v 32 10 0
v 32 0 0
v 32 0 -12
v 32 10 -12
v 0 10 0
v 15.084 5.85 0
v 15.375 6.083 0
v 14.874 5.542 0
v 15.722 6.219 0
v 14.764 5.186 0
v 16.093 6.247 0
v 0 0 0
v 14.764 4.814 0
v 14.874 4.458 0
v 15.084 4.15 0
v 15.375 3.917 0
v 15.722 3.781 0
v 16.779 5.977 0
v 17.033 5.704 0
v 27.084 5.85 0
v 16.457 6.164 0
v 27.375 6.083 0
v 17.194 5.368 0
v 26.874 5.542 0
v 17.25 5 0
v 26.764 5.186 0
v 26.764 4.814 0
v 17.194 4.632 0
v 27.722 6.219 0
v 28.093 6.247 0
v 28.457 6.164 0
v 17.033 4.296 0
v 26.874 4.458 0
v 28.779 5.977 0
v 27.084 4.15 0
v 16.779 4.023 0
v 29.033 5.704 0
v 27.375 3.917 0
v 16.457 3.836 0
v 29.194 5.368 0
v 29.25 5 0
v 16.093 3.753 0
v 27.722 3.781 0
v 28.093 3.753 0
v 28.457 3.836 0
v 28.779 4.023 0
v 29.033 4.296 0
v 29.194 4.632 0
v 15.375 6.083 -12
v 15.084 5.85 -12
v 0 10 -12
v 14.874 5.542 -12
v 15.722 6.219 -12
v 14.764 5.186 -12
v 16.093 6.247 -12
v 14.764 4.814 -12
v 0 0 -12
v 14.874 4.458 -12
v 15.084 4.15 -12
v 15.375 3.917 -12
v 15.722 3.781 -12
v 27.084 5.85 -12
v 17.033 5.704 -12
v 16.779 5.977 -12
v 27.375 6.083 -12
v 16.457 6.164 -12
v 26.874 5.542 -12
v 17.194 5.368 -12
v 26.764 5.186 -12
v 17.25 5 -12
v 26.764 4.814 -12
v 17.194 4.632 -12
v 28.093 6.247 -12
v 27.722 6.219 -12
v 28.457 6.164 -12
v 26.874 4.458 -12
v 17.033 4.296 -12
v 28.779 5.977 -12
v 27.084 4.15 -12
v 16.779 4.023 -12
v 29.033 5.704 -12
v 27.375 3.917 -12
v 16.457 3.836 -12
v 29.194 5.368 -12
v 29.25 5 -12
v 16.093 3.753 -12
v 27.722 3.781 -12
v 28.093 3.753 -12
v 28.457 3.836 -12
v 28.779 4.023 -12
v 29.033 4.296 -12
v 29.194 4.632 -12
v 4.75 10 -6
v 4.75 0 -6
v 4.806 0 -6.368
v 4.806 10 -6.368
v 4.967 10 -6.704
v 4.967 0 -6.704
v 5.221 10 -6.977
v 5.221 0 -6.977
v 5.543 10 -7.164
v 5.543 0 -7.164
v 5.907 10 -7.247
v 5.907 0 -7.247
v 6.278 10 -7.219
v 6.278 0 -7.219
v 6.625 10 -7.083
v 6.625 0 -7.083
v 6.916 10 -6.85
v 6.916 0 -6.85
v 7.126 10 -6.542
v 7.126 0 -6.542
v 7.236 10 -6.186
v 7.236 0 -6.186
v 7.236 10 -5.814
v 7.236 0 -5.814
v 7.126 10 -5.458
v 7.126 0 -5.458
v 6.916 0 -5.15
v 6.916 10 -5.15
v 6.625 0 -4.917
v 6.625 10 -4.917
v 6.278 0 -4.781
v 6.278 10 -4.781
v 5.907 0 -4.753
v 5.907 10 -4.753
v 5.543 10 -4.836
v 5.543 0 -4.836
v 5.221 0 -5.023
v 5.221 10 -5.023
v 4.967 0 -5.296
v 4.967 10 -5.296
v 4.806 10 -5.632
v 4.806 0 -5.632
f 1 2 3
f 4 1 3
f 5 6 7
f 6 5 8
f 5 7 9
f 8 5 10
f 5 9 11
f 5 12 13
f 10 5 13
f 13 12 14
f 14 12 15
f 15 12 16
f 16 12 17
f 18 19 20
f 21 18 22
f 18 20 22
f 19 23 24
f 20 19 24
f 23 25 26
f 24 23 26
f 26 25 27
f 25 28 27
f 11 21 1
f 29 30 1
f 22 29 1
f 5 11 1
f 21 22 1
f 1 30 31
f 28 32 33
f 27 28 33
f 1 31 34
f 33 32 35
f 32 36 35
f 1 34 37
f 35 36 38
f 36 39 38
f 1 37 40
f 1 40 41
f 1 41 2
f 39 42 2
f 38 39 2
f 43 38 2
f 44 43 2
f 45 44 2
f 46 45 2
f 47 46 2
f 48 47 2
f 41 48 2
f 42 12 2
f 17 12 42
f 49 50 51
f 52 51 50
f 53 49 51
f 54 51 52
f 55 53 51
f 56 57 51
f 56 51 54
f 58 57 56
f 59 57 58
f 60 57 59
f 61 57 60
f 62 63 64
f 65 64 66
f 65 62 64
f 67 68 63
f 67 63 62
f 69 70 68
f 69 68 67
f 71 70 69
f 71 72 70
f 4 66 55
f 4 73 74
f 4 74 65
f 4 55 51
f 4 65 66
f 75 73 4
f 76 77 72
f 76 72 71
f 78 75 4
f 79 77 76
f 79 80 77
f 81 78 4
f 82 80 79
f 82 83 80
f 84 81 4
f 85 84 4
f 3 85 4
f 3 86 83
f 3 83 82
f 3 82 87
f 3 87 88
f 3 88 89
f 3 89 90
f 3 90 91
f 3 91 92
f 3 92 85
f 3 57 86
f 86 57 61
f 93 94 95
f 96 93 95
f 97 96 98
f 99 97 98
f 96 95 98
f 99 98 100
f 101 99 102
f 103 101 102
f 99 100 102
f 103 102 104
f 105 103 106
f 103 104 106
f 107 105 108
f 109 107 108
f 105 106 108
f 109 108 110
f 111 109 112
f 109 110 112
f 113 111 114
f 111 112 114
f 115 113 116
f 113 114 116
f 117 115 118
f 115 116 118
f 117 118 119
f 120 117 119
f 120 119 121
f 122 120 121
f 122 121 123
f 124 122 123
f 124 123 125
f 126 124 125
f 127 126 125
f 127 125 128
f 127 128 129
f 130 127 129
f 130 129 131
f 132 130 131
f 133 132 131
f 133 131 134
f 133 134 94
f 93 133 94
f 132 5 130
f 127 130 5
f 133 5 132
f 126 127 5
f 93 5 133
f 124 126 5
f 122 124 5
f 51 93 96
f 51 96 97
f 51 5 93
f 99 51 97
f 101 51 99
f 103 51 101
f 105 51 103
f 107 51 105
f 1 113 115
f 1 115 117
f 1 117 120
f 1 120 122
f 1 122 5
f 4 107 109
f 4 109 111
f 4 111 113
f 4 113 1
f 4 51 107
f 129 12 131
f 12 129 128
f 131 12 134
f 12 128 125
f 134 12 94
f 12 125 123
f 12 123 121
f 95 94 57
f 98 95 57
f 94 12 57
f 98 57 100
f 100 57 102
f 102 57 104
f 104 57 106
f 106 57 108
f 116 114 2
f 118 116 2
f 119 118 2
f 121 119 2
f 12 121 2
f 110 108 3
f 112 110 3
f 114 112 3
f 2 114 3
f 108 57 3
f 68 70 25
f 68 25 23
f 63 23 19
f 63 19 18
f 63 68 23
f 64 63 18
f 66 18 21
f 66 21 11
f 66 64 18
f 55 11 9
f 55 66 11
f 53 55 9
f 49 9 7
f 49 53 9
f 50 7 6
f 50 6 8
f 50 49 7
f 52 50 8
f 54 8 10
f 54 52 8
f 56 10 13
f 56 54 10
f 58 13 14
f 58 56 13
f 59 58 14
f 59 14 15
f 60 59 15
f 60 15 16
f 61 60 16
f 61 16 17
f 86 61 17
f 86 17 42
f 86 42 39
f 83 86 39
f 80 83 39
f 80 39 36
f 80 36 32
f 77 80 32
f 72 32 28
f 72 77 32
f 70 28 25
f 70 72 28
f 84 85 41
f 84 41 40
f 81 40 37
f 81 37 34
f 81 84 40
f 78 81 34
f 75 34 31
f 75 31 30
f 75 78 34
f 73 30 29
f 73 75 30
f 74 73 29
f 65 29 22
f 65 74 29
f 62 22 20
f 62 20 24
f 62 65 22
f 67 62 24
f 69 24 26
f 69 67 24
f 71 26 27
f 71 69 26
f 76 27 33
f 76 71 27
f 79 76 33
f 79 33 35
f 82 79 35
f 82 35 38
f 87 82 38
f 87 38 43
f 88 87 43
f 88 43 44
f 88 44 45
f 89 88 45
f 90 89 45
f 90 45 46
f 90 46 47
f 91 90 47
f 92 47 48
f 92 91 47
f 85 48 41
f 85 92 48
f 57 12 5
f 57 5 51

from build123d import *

# Parameters (mm, degrees)
SKETCH1_W                           = 32
SKETCH1_H                           = 12
BOSS_EXTRUDE1_DEPTH                 = 10
TAP_DRILL_FOR_M3X0_5_TAP1_D         = 2.5
TAP_START                           = -12
TAP_DRILL_FOR_M3X0_5_TAP2_OUTLINE_R = 1.25
TAP_DRILL_FOR_M3X0_5_TAP2_DEPTH     = 12


# Read off the part's stored shape, not the designer's step: Tap Drill for M3x0.5 Tap2
with BuildPart() as part:
    # Sketch1 → Boss-Extrude1 (new body)
    with BuildSketch(Plane(origin=(0, 0, 0), x_dir=(1, 0, 0), z_dir=(0, 1, 0))):
        with Locations((16, 6)):
            Rectangle(SKETCH1_W, SKETCH1_H)
    extrude(amount=BOSS_EXTRUDE1_DEPTH)

    # Tap Drill for M3x0.5 Tap1 (through all)
    with Locations(Plane(origin=(0, 10, 0), x_dir=(1, 0, 0), z_dir=(0, 1, 0))):
        with Locations((6, 6)):
            Hole(TAP_DRILL_FOR_M3X0_5_TAP1_D / 2)

    # Tap Drill for M3x0.5 Tap2 outline → Tap Drill for M3x0.5 Tap2 (cut)
    with BuildSketch(Plane.XY.offset(TAP_START)):
        with Locations((16, 5)):
            Circle(TAP_DRILL_FOR_M3X0_5_TAP2_OUTLINE_R)
        with Locations((28, 5)):
            Circle(TAP_DRILL_FOR_M3X0_5_TAP2_OUTLINE_R)
    extrude(amount=TAP_DRILL_FOR_M3X0_5_TAP2_DEPTH, mode=Mode.SUBTRACT)


solid = part.part
